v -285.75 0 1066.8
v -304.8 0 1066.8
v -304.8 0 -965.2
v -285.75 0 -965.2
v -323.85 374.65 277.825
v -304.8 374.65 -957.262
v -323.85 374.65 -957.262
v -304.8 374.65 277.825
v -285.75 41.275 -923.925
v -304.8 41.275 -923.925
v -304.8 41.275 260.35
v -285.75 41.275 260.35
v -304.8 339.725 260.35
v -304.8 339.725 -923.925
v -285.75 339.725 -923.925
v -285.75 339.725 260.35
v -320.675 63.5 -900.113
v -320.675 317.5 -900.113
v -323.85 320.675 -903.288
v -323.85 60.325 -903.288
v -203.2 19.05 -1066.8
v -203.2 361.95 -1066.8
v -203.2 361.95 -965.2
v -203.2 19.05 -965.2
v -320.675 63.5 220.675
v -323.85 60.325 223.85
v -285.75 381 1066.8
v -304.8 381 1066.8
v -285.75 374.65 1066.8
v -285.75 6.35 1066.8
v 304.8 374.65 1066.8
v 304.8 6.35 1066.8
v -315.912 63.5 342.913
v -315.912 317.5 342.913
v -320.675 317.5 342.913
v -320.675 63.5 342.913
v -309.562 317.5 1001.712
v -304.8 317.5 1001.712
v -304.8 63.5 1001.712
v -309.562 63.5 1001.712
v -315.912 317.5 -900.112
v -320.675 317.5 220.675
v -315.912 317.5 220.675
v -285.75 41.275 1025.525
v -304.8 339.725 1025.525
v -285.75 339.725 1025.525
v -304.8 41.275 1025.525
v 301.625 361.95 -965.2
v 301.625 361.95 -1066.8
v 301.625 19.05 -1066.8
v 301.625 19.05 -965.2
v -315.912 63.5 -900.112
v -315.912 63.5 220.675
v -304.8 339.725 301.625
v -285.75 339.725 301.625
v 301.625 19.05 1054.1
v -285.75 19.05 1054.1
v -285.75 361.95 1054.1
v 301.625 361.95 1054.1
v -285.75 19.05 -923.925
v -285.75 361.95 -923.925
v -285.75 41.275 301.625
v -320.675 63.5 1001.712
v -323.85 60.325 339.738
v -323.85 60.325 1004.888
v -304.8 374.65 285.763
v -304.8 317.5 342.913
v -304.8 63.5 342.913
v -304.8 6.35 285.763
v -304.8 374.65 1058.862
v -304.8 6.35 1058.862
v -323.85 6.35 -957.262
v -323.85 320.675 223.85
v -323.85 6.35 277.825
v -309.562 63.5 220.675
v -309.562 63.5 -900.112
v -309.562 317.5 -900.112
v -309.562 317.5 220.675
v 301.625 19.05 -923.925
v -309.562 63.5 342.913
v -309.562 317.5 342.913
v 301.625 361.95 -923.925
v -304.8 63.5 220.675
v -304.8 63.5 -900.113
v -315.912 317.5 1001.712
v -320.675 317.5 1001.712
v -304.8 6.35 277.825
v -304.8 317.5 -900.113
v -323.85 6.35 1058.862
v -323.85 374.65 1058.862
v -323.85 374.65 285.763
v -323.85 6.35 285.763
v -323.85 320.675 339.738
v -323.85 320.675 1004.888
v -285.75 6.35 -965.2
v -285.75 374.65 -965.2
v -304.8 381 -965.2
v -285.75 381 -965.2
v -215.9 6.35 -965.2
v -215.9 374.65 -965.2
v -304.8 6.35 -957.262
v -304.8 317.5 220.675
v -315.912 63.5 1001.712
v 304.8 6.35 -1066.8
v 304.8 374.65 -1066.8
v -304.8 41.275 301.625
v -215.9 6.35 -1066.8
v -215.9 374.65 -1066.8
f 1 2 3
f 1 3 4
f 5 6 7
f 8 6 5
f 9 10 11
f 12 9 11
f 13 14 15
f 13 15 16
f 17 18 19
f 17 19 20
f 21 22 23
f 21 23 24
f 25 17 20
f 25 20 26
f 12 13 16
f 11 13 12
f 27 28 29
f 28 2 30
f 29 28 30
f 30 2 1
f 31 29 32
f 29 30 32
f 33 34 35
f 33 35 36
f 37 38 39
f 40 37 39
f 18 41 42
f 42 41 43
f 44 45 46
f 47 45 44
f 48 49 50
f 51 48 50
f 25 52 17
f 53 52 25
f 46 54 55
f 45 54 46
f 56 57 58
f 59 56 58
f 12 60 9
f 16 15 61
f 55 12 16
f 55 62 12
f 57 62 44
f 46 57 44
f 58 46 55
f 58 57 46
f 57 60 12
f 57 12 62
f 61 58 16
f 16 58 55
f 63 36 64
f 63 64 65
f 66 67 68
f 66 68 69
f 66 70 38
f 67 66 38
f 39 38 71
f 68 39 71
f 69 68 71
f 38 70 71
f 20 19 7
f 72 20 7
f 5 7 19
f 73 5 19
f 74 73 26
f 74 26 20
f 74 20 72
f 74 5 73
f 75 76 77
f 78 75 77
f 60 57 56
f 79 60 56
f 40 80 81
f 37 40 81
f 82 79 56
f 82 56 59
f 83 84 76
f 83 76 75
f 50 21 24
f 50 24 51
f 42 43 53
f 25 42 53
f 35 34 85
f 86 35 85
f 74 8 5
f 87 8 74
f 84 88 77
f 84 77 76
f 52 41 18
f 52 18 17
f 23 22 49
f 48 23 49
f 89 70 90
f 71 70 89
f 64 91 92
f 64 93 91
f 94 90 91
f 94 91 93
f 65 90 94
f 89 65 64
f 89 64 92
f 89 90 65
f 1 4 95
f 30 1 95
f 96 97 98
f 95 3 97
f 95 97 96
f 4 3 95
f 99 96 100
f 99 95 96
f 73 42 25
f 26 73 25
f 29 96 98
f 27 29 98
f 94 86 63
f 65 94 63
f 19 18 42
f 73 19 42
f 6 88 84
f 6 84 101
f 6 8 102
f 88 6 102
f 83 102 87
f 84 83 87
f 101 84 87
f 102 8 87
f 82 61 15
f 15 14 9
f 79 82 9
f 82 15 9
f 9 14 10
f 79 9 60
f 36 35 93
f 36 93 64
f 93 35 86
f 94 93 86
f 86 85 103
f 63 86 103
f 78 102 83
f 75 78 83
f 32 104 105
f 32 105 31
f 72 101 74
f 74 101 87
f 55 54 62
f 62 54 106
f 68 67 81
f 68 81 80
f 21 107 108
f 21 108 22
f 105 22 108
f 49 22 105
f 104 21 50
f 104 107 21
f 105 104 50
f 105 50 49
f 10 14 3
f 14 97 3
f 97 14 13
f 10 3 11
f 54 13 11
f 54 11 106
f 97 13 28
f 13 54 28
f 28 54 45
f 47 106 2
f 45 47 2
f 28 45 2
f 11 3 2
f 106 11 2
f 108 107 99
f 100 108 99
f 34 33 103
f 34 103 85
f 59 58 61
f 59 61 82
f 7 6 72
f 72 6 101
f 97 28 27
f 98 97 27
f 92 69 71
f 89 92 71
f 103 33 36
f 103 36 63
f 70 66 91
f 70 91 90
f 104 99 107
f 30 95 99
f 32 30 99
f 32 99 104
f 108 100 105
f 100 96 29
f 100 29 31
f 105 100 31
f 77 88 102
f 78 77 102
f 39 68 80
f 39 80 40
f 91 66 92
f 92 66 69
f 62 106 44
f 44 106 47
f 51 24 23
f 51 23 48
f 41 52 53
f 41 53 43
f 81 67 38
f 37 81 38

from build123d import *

# Parameters (mm, degrees)
F0_W      = 609.6
F0_H      = 2133.6
F1_DEPTH  = 381
F2_W      = 88.9
F2_H      = 101.6
F3_DEPTH  = 381.001
F4_W      = 298.45
F4_H      = 1949.45
F5_DEPTH  = 19.05
F6_W      = 590.55
F6_H      = 6.35
F7_DEPTH  = 2133.601
F8_W      = 587.375
F8_H      = 342.9
F9_DEPTH  = 1990.725
F10_W     = 298.45
F10_H     = 41.275
F11_DEPTH = 19.05
F12_W     = 368.3
F12_H     = 1235.0877
F12_W_2   = 254
F12_H_2   = 1120.7877
F12_H_3   = 773.0998
F12_H_4   = 658.7998
F13_DEPTH = 19.05
F14_W     = 6.35
F14_H     = 254
F15_DEPTH = 1120.7877
F16_W     = 6.35
F16_H     = 254
F17_DEPTH = 658.7998
F18_SIZE  = 3.175
F19_W     = 504.825
F19_H     = 342.9
F20_DEPTH = 101.6
F21_W     = 342.9
F21_H     = 12.7
F22_DEPTH = 587.375


with BuildPart() as f1:
    # F0 (on Front) → F1 (new body)
    with BuildSketch(Plane.XZ):
        Rectangle(F0_W, F0_H)
    extrude(amount=-F1_DEPTH)

    # F2 (on face) → F3 (cut, through all)
    with BuildSketch(Plane.XZ):
        with Locations((-260.35, -1016)):
            Rectangle(F2_W, F2_H)
    extrude(amount=-F3_DEPTH, mode=Mode.SUBTRACT)

    # F4 (on face) → F5 (cut)
    with BuildSketch(Plane(origin=(-304.8, 0, 0), x_dir=(0, -1, 0), z_dir=(-1, 0, 0))):
        with Locations((-190.5, 50.8)):
            Rectangle(F4_W, F4_H)
    extrude(amount=-F5_DEPTH, mode=Mode.SUBTRACT)

    # F6 (on face) → F7 (cut, through all)
    with BuildSketch(Plane.XY.offset(1066.8)):
        with Locations((9.525, 377.825)):
            Rectangle(F6_W, F6_H)
        with Locations((9.525, 3.175)):
            Rectangle(F6_W, F6_H)
    extrude(amount=-F7_DEPTH, mode=Mode.SUBTRACT)

    # F8 (on face) → F9 (cut, through all)
    with BuildSketch(Plane.XY.offset(1066.8)):
        with Locations((7.9375, 190.5)):
            Rectangle(F8_W, F8_H)
    extrude(amount=-F9_DEPTH, mode=Mode.SUBTRACT)

    # F10 (on face) → F11 (join, through all)
    with BuildSketch(Plane(origin=(-304.8, 0, 0), x_dir=(0, -1, 0), z_dir=(-1, 0, 0))):
        with Locations((-190.5, 280.9875)):
            Rectangle(F10_W, F10_H)
    extrude(amount=-F11_DEPTH)

    # F19 (on face) → F20 (cut)
    with BuildSketch(Plane(origin=(0, 0, -1066.8), x_dir=(1, 0, 0), z_dir=(0, 0, -1))):
        with Locations((49.2125, -190.5)):
            Rectangle(F19_W, F19_H)
    extrude(amount=-F20_DEPTH, mode=Mode.SUBTRACT)

    # F21 (on face) → F22 (join, through all)
    with BuildSketch(Plane.YZ.offset(-285.75)):
        with Locations((190.5, 1060.45)):
            Rectangle(F21_W, F21_H)
    extrude(amount=F22_DEPTH)


with BuildPart() as f13:
    # F12 (on face) → F13 (new body)
    with BuildSketch(Plane(origin=(-304.8, 0, 0), x_dir=(0, -1, 0), z_dir=(-1, 0, 0))):
        with Locations((-190.5, -339.71865)):
            Rectangle(F12_W, F12_H)
        with Locations((-190.5, -339.71865)):
            Rectangle(F12_W_2, F12_H_2, mode=Mode.SUBTRACT)
        with Locations((-190.5, 672.3126)):
            Rectangle(F12_W, F12_H_3)
        with Locations((-190.5, 672.3126)):
            Rectangle(F12_W_2, F12_H_4, mode=Mode.SUBTRACT)
    extrude(amount=F13_DEPTH)

    # F14 (on face) → F15 (join, through all)
    with BuildSketch(Plane.XY.offset(-900.1125)):
        with Locations((-312.7375, 190.5)):
            Rectangle(F14_W, F14_H)
    extrude(amount=F15_DEPTH)

    # F16 (on face) → F17 (join, through all)
    with BuildSketch(Plane.XY.offset(342.9127)):
        with Locations((-312.7375, 190.5)):
            Rectangle(F16_W, F16_H)
    extrude(amount=F17_DEPTH)

    # F18
    f18_edges = [f13.edges().sort_by_distance(p)[0] for p in [
        (-323.85, 317.5, -339.71865),
        (-323.85, 190.5, -900.1125),
        (-323.85, 63.5, -339.71865),
        (-323.85, 190.5, 220.6752),
        (-323.85, 190.5, 342.9127),
        (-323.85, 317.5, 672.3126),
        (-323.85, 63.5, 672.3126),
        (-323.85, 190.5, 1001.7125),
    ]]
    chamfer(f18_edges, length=F18_SIZE)


solid = Compound([f1.part, f13.part])
